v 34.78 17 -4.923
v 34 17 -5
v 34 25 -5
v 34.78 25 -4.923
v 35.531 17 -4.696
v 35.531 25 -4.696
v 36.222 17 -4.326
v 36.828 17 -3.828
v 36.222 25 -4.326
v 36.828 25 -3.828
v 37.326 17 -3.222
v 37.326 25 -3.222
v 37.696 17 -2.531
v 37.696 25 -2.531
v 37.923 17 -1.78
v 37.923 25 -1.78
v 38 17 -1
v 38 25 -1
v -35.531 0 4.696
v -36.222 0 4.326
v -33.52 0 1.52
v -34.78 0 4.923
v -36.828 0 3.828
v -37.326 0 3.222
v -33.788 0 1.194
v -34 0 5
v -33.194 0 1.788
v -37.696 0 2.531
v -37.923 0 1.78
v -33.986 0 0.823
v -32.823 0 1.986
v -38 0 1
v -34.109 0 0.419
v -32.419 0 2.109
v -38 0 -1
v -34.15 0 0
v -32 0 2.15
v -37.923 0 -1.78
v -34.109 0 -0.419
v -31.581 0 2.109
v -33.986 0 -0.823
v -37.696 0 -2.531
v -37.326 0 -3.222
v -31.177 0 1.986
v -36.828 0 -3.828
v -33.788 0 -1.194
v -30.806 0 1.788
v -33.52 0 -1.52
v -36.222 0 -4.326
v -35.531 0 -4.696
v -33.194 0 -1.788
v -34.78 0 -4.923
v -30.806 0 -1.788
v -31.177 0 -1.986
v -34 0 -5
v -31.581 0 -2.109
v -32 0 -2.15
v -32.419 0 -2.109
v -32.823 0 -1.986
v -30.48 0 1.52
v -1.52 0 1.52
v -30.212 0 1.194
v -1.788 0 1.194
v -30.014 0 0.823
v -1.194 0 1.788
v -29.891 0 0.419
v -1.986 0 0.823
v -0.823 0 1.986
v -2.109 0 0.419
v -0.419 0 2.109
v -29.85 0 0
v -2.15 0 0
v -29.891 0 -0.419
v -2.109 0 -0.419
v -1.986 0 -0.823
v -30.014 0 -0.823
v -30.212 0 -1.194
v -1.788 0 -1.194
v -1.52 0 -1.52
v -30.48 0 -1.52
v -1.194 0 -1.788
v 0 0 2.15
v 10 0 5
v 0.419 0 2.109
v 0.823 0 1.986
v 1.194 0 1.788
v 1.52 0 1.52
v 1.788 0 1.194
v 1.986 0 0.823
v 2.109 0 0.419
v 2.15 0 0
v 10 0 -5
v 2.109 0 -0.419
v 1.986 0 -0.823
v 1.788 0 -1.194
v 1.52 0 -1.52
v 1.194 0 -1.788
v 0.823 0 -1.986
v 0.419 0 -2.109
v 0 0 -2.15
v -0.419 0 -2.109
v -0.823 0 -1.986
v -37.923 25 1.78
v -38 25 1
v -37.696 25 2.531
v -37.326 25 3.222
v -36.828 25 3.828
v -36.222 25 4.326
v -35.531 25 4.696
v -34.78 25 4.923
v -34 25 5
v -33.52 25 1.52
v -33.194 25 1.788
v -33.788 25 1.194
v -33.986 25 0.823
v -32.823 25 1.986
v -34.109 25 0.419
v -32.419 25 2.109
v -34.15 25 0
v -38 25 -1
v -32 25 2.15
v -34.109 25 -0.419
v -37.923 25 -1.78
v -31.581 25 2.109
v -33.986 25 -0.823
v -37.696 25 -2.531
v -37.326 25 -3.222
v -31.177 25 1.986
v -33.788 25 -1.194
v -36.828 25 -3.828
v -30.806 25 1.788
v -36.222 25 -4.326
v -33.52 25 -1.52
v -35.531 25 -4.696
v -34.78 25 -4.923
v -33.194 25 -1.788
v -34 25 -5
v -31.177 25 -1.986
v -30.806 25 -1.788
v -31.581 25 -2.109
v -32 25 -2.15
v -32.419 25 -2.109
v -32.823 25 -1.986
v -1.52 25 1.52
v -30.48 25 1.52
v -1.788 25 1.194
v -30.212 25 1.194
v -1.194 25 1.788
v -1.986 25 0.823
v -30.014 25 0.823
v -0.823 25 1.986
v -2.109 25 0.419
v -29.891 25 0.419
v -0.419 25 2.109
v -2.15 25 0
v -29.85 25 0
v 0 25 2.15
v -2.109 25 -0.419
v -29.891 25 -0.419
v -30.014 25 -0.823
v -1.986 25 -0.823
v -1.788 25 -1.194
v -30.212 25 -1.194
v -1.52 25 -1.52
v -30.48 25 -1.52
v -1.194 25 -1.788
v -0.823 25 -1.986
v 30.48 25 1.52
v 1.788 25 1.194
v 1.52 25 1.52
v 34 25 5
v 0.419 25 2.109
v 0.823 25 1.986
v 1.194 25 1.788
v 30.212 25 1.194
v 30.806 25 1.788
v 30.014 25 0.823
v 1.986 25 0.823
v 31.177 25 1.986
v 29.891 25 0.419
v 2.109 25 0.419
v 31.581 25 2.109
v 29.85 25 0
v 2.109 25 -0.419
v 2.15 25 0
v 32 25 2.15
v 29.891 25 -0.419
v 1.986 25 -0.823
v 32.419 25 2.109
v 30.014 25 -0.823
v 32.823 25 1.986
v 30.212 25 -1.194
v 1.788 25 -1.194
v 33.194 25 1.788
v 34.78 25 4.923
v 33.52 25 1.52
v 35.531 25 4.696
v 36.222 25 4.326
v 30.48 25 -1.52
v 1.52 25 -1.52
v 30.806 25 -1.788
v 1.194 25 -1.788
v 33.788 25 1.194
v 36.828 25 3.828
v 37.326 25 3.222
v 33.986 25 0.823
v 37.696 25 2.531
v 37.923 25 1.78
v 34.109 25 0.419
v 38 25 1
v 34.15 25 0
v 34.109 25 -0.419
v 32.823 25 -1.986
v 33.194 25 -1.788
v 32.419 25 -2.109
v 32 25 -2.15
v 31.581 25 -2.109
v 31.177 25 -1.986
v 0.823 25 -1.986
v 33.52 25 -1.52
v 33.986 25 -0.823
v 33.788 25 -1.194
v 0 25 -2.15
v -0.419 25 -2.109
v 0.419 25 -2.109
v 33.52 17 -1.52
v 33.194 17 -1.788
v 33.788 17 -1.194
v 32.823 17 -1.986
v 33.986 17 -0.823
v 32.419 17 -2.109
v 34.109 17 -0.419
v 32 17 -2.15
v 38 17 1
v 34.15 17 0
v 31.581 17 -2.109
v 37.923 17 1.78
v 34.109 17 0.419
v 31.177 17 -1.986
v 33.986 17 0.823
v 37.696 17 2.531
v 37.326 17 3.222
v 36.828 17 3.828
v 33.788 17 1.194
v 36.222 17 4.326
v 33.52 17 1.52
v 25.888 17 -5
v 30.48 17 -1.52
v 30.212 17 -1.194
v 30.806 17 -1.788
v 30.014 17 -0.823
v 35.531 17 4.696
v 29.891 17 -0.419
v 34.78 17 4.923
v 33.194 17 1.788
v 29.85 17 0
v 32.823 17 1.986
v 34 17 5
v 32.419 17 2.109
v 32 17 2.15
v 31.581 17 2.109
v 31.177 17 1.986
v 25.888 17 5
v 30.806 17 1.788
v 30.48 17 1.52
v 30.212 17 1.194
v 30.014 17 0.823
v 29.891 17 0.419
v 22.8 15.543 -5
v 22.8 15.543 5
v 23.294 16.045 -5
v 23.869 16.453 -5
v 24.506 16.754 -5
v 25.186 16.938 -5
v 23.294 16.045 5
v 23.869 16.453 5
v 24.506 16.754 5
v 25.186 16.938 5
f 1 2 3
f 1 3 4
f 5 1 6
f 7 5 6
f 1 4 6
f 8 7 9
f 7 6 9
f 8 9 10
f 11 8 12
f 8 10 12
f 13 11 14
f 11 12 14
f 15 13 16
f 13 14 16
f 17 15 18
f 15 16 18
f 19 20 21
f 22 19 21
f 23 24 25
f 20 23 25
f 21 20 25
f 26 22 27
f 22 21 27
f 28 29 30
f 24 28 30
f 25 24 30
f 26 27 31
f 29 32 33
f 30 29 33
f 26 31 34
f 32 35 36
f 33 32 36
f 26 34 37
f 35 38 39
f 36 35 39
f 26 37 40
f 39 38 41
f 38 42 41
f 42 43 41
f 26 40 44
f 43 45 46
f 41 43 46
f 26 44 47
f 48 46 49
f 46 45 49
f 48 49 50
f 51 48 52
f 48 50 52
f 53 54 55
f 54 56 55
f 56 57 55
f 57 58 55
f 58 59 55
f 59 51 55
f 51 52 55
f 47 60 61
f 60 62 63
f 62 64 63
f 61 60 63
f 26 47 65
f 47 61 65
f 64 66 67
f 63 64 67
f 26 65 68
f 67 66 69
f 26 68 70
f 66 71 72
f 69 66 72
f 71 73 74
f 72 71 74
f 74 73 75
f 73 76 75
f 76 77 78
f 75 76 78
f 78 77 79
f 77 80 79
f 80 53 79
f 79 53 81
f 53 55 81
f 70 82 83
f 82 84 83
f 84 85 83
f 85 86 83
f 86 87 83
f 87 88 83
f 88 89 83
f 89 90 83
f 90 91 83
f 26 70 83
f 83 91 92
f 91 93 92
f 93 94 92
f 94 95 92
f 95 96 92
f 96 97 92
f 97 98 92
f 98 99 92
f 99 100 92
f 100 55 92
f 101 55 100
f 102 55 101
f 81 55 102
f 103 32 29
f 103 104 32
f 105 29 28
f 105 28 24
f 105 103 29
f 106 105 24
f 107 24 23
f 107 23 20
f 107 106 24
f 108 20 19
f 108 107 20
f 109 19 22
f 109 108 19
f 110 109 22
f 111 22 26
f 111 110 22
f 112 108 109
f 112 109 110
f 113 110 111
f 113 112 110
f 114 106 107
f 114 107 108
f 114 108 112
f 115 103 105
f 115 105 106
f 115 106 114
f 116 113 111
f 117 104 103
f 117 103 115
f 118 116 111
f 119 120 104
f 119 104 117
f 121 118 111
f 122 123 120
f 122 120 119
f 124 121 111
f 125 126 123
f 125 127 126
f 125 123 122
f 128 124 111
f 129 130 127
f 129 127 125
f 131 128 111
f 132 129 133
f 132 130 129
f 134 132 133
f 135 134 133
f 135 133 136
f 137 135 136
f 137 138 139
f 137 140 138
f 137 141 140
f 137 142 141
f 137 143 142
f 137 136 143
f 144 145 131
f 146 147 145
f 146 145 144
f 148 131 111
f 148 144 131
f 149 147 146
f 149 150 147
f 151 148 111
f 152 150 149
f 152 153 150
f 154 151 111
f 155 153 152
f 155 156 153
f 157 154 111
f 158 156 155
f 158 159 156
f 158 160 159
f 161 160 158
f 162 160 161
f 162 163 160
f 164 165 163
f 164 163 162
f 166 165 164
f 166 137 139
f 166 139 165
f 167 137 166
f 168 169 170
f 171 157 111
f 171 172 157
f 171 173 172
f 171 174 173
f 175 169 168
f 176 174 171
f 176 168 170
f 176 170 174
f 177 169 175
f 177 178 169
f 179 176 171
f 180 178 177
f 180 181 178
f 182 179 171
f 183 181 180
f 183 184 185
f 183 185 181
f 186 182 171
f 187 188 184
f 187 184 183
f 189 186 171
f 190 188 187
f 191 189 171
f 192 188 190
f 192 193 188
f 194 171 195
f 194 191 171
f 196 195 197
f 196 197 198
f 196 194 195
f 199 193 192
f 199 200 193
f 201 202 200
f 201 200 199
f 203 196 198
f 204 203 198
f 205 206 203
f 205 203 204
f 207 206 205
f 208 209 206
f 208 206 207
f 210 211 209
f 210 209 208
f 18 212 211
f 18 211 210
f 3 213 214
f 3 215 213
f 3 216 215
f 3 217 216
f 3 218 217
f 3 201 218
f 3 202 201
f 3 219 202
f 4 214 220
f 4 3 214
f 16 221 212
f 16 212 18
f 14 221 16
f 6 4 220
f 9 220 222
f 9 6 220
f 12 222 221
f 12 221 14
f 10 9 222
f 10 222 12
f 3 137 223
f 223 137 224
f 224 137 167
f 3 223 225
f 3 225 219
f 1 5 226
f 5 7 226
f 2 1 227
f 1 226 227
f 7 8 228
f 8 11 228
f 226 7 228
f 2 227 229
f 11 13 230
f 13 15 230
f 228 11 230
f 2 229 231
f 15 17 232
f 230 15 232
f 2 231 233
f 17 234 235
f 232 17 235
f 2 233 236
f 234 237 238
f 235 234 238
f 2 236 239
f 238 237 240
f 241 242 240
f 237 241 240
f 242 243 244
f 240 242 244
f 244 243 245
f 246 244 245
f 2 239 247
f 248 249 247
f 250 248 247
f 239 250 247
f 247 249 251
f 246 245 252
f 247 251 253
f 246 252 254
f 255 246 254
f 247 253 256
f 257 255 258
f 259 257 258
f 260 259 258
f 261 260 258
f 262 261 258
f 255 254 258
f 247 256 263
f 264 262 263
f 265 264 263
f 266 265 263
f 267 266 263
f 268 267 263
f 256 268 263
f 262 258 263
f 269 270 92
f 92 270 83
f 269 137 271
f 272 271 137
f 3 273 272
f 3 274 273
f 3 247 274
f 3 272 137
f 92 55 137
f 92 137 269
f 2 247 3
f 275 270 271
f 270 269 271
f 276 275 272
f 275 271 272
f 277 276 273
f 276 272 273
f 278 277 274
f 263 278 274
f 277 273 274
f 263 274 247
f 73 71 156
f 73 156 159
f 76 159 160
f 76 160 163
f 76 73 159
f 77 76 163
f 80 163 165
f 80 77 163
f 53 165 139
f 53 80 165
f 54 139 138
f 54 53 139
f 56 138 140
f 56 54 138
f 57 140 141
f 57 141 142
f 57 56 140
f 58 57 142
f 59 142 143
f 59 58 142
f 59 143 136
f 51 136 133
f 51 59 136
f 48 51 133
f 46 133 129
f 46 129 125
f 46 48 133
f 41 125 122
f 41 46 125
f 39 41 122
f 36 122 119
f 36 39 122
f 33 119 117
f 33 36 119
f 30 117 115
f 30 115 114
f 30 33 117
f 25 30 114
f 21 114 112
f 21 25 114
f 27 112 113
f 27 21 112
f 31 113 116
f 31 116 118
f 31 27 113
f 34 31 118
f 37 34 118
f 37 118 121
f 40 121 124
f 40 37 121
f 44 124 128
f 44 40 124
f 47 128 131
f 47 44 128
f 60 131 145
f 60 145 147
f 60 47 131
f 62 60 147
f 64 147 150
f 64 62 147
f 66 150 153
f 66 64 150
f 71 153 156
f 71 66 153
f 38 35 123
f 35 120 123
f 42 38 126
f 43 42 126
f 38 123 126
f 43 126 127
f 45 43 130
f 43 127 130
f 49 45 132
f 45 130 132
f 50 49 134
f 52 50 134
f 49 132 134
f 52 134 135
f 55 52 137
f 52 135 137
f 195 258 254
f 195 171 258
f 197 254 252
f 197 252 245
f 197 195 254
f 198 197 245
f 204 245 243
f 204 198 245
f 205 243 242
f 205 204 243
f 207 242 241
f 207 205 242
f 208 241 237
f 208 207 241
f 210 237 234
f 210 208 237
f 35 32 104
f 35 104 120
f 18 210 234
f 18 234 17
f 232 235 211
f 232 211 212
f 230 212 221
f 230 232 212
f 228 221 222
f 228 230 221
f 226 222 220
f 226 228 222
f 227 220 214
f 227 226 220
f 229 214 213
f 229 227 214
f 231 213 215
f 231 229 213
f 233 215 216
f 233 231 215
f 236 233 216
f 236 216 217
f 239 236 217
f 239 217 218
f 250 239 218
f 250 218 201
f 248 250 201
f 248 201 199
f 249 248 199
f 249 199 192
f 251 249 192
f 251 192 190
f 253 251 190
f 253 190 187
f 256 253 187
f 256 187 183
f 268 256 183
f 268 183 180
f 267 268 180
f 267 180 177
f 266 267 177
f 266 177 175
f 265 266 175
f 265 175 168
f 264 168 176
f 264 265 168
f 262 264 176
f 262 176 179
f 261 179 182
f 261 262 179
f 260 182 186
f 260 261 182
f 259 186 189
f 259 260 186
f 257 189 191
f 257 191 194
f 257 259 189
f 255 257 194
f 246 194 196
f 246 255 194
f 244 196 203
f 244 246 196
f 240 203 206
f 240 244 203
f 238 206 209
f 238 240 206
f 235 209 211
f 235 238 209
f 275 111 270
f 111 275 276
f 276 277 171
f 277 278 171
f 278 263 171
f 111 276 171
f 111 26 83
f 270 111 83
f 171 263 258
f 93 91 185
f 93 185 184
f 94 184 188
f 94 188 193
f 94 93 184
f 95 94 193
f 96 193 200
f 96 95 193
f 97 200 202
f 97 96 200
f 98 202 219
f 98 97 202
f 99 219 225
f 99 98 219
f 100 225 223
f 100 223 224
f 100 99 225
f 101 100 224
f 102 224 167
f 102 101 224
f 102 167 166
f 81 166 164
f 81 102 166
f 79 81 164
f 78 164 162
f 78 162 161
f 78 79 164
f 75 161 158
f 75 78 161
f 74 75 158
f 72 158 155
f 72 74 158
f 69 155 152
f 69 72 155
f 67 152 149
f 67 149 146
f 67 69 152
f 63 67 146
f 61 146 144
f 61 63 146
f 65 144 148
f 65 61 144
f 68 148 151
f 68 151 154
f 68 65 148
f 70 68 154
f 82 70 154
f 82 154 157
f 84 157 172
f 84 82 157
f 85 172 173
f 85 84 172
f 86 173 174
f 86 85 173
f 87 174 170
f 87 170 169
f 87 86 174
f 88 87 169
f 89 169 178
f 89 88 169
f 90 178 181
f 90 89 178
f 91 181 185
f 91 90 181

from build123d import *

# Parameters (mm, degrees)
SKETCH2_W           = 76
SKETCH2_H           = 10
SKETCH2_R           = 2.15
BOSS_EXTRUDE1_DEPTH = 25
CUT_EXTRUDE1_DEPTH  = 27
FILLET1_R           = 4


with BuildPart() as part:
    # Sketch2 → Boss-Extrude1 (new body)
    with BuildSketch(Plane(origin=(0, 0, 0), x_dir=(1, 0, 0), z_dir=(0, 1, 0))):
        Rectangle(SKETCH2_W, SKETCH2_H)
        with Locations((-32, 0)):
            Circle(SKETCH2_R, mode=Mode.SUBTRACT)
        Circle(SKETCH2_R, mode=Mode.SUBTRACT)
        with Locations((32, 0)):
            Circle(SKETCH2_R, mode=Mode.SUBTRACT)
    extrude(amount=BOSS_EXTRUDE1_DEPTH)

    # Sketch3 → Cut-Extrude1 (cut)
    with BuildSketch(Plane.XY.offset(5)):
        Polygon((38, 17), (24, 17), (10, 0), (38, 0), align=None)
    extrude(amount=-CUT_EXTRUDE1_DEPTH, mode=Mode.SUBTRACT)

    # Fillet1
    fillet1_edges = [part.edges().sort_by_distance(p)[0] for p in [
        (24, 17, 0),
        (38, 21, 5),
        (-38, 12.5, 5),
        (-38, 12.5, -5),
        (38, 21, -5),
    ]]
    fillet(fillet1_edges, radius=FILLET1_R)


solid = part.part
